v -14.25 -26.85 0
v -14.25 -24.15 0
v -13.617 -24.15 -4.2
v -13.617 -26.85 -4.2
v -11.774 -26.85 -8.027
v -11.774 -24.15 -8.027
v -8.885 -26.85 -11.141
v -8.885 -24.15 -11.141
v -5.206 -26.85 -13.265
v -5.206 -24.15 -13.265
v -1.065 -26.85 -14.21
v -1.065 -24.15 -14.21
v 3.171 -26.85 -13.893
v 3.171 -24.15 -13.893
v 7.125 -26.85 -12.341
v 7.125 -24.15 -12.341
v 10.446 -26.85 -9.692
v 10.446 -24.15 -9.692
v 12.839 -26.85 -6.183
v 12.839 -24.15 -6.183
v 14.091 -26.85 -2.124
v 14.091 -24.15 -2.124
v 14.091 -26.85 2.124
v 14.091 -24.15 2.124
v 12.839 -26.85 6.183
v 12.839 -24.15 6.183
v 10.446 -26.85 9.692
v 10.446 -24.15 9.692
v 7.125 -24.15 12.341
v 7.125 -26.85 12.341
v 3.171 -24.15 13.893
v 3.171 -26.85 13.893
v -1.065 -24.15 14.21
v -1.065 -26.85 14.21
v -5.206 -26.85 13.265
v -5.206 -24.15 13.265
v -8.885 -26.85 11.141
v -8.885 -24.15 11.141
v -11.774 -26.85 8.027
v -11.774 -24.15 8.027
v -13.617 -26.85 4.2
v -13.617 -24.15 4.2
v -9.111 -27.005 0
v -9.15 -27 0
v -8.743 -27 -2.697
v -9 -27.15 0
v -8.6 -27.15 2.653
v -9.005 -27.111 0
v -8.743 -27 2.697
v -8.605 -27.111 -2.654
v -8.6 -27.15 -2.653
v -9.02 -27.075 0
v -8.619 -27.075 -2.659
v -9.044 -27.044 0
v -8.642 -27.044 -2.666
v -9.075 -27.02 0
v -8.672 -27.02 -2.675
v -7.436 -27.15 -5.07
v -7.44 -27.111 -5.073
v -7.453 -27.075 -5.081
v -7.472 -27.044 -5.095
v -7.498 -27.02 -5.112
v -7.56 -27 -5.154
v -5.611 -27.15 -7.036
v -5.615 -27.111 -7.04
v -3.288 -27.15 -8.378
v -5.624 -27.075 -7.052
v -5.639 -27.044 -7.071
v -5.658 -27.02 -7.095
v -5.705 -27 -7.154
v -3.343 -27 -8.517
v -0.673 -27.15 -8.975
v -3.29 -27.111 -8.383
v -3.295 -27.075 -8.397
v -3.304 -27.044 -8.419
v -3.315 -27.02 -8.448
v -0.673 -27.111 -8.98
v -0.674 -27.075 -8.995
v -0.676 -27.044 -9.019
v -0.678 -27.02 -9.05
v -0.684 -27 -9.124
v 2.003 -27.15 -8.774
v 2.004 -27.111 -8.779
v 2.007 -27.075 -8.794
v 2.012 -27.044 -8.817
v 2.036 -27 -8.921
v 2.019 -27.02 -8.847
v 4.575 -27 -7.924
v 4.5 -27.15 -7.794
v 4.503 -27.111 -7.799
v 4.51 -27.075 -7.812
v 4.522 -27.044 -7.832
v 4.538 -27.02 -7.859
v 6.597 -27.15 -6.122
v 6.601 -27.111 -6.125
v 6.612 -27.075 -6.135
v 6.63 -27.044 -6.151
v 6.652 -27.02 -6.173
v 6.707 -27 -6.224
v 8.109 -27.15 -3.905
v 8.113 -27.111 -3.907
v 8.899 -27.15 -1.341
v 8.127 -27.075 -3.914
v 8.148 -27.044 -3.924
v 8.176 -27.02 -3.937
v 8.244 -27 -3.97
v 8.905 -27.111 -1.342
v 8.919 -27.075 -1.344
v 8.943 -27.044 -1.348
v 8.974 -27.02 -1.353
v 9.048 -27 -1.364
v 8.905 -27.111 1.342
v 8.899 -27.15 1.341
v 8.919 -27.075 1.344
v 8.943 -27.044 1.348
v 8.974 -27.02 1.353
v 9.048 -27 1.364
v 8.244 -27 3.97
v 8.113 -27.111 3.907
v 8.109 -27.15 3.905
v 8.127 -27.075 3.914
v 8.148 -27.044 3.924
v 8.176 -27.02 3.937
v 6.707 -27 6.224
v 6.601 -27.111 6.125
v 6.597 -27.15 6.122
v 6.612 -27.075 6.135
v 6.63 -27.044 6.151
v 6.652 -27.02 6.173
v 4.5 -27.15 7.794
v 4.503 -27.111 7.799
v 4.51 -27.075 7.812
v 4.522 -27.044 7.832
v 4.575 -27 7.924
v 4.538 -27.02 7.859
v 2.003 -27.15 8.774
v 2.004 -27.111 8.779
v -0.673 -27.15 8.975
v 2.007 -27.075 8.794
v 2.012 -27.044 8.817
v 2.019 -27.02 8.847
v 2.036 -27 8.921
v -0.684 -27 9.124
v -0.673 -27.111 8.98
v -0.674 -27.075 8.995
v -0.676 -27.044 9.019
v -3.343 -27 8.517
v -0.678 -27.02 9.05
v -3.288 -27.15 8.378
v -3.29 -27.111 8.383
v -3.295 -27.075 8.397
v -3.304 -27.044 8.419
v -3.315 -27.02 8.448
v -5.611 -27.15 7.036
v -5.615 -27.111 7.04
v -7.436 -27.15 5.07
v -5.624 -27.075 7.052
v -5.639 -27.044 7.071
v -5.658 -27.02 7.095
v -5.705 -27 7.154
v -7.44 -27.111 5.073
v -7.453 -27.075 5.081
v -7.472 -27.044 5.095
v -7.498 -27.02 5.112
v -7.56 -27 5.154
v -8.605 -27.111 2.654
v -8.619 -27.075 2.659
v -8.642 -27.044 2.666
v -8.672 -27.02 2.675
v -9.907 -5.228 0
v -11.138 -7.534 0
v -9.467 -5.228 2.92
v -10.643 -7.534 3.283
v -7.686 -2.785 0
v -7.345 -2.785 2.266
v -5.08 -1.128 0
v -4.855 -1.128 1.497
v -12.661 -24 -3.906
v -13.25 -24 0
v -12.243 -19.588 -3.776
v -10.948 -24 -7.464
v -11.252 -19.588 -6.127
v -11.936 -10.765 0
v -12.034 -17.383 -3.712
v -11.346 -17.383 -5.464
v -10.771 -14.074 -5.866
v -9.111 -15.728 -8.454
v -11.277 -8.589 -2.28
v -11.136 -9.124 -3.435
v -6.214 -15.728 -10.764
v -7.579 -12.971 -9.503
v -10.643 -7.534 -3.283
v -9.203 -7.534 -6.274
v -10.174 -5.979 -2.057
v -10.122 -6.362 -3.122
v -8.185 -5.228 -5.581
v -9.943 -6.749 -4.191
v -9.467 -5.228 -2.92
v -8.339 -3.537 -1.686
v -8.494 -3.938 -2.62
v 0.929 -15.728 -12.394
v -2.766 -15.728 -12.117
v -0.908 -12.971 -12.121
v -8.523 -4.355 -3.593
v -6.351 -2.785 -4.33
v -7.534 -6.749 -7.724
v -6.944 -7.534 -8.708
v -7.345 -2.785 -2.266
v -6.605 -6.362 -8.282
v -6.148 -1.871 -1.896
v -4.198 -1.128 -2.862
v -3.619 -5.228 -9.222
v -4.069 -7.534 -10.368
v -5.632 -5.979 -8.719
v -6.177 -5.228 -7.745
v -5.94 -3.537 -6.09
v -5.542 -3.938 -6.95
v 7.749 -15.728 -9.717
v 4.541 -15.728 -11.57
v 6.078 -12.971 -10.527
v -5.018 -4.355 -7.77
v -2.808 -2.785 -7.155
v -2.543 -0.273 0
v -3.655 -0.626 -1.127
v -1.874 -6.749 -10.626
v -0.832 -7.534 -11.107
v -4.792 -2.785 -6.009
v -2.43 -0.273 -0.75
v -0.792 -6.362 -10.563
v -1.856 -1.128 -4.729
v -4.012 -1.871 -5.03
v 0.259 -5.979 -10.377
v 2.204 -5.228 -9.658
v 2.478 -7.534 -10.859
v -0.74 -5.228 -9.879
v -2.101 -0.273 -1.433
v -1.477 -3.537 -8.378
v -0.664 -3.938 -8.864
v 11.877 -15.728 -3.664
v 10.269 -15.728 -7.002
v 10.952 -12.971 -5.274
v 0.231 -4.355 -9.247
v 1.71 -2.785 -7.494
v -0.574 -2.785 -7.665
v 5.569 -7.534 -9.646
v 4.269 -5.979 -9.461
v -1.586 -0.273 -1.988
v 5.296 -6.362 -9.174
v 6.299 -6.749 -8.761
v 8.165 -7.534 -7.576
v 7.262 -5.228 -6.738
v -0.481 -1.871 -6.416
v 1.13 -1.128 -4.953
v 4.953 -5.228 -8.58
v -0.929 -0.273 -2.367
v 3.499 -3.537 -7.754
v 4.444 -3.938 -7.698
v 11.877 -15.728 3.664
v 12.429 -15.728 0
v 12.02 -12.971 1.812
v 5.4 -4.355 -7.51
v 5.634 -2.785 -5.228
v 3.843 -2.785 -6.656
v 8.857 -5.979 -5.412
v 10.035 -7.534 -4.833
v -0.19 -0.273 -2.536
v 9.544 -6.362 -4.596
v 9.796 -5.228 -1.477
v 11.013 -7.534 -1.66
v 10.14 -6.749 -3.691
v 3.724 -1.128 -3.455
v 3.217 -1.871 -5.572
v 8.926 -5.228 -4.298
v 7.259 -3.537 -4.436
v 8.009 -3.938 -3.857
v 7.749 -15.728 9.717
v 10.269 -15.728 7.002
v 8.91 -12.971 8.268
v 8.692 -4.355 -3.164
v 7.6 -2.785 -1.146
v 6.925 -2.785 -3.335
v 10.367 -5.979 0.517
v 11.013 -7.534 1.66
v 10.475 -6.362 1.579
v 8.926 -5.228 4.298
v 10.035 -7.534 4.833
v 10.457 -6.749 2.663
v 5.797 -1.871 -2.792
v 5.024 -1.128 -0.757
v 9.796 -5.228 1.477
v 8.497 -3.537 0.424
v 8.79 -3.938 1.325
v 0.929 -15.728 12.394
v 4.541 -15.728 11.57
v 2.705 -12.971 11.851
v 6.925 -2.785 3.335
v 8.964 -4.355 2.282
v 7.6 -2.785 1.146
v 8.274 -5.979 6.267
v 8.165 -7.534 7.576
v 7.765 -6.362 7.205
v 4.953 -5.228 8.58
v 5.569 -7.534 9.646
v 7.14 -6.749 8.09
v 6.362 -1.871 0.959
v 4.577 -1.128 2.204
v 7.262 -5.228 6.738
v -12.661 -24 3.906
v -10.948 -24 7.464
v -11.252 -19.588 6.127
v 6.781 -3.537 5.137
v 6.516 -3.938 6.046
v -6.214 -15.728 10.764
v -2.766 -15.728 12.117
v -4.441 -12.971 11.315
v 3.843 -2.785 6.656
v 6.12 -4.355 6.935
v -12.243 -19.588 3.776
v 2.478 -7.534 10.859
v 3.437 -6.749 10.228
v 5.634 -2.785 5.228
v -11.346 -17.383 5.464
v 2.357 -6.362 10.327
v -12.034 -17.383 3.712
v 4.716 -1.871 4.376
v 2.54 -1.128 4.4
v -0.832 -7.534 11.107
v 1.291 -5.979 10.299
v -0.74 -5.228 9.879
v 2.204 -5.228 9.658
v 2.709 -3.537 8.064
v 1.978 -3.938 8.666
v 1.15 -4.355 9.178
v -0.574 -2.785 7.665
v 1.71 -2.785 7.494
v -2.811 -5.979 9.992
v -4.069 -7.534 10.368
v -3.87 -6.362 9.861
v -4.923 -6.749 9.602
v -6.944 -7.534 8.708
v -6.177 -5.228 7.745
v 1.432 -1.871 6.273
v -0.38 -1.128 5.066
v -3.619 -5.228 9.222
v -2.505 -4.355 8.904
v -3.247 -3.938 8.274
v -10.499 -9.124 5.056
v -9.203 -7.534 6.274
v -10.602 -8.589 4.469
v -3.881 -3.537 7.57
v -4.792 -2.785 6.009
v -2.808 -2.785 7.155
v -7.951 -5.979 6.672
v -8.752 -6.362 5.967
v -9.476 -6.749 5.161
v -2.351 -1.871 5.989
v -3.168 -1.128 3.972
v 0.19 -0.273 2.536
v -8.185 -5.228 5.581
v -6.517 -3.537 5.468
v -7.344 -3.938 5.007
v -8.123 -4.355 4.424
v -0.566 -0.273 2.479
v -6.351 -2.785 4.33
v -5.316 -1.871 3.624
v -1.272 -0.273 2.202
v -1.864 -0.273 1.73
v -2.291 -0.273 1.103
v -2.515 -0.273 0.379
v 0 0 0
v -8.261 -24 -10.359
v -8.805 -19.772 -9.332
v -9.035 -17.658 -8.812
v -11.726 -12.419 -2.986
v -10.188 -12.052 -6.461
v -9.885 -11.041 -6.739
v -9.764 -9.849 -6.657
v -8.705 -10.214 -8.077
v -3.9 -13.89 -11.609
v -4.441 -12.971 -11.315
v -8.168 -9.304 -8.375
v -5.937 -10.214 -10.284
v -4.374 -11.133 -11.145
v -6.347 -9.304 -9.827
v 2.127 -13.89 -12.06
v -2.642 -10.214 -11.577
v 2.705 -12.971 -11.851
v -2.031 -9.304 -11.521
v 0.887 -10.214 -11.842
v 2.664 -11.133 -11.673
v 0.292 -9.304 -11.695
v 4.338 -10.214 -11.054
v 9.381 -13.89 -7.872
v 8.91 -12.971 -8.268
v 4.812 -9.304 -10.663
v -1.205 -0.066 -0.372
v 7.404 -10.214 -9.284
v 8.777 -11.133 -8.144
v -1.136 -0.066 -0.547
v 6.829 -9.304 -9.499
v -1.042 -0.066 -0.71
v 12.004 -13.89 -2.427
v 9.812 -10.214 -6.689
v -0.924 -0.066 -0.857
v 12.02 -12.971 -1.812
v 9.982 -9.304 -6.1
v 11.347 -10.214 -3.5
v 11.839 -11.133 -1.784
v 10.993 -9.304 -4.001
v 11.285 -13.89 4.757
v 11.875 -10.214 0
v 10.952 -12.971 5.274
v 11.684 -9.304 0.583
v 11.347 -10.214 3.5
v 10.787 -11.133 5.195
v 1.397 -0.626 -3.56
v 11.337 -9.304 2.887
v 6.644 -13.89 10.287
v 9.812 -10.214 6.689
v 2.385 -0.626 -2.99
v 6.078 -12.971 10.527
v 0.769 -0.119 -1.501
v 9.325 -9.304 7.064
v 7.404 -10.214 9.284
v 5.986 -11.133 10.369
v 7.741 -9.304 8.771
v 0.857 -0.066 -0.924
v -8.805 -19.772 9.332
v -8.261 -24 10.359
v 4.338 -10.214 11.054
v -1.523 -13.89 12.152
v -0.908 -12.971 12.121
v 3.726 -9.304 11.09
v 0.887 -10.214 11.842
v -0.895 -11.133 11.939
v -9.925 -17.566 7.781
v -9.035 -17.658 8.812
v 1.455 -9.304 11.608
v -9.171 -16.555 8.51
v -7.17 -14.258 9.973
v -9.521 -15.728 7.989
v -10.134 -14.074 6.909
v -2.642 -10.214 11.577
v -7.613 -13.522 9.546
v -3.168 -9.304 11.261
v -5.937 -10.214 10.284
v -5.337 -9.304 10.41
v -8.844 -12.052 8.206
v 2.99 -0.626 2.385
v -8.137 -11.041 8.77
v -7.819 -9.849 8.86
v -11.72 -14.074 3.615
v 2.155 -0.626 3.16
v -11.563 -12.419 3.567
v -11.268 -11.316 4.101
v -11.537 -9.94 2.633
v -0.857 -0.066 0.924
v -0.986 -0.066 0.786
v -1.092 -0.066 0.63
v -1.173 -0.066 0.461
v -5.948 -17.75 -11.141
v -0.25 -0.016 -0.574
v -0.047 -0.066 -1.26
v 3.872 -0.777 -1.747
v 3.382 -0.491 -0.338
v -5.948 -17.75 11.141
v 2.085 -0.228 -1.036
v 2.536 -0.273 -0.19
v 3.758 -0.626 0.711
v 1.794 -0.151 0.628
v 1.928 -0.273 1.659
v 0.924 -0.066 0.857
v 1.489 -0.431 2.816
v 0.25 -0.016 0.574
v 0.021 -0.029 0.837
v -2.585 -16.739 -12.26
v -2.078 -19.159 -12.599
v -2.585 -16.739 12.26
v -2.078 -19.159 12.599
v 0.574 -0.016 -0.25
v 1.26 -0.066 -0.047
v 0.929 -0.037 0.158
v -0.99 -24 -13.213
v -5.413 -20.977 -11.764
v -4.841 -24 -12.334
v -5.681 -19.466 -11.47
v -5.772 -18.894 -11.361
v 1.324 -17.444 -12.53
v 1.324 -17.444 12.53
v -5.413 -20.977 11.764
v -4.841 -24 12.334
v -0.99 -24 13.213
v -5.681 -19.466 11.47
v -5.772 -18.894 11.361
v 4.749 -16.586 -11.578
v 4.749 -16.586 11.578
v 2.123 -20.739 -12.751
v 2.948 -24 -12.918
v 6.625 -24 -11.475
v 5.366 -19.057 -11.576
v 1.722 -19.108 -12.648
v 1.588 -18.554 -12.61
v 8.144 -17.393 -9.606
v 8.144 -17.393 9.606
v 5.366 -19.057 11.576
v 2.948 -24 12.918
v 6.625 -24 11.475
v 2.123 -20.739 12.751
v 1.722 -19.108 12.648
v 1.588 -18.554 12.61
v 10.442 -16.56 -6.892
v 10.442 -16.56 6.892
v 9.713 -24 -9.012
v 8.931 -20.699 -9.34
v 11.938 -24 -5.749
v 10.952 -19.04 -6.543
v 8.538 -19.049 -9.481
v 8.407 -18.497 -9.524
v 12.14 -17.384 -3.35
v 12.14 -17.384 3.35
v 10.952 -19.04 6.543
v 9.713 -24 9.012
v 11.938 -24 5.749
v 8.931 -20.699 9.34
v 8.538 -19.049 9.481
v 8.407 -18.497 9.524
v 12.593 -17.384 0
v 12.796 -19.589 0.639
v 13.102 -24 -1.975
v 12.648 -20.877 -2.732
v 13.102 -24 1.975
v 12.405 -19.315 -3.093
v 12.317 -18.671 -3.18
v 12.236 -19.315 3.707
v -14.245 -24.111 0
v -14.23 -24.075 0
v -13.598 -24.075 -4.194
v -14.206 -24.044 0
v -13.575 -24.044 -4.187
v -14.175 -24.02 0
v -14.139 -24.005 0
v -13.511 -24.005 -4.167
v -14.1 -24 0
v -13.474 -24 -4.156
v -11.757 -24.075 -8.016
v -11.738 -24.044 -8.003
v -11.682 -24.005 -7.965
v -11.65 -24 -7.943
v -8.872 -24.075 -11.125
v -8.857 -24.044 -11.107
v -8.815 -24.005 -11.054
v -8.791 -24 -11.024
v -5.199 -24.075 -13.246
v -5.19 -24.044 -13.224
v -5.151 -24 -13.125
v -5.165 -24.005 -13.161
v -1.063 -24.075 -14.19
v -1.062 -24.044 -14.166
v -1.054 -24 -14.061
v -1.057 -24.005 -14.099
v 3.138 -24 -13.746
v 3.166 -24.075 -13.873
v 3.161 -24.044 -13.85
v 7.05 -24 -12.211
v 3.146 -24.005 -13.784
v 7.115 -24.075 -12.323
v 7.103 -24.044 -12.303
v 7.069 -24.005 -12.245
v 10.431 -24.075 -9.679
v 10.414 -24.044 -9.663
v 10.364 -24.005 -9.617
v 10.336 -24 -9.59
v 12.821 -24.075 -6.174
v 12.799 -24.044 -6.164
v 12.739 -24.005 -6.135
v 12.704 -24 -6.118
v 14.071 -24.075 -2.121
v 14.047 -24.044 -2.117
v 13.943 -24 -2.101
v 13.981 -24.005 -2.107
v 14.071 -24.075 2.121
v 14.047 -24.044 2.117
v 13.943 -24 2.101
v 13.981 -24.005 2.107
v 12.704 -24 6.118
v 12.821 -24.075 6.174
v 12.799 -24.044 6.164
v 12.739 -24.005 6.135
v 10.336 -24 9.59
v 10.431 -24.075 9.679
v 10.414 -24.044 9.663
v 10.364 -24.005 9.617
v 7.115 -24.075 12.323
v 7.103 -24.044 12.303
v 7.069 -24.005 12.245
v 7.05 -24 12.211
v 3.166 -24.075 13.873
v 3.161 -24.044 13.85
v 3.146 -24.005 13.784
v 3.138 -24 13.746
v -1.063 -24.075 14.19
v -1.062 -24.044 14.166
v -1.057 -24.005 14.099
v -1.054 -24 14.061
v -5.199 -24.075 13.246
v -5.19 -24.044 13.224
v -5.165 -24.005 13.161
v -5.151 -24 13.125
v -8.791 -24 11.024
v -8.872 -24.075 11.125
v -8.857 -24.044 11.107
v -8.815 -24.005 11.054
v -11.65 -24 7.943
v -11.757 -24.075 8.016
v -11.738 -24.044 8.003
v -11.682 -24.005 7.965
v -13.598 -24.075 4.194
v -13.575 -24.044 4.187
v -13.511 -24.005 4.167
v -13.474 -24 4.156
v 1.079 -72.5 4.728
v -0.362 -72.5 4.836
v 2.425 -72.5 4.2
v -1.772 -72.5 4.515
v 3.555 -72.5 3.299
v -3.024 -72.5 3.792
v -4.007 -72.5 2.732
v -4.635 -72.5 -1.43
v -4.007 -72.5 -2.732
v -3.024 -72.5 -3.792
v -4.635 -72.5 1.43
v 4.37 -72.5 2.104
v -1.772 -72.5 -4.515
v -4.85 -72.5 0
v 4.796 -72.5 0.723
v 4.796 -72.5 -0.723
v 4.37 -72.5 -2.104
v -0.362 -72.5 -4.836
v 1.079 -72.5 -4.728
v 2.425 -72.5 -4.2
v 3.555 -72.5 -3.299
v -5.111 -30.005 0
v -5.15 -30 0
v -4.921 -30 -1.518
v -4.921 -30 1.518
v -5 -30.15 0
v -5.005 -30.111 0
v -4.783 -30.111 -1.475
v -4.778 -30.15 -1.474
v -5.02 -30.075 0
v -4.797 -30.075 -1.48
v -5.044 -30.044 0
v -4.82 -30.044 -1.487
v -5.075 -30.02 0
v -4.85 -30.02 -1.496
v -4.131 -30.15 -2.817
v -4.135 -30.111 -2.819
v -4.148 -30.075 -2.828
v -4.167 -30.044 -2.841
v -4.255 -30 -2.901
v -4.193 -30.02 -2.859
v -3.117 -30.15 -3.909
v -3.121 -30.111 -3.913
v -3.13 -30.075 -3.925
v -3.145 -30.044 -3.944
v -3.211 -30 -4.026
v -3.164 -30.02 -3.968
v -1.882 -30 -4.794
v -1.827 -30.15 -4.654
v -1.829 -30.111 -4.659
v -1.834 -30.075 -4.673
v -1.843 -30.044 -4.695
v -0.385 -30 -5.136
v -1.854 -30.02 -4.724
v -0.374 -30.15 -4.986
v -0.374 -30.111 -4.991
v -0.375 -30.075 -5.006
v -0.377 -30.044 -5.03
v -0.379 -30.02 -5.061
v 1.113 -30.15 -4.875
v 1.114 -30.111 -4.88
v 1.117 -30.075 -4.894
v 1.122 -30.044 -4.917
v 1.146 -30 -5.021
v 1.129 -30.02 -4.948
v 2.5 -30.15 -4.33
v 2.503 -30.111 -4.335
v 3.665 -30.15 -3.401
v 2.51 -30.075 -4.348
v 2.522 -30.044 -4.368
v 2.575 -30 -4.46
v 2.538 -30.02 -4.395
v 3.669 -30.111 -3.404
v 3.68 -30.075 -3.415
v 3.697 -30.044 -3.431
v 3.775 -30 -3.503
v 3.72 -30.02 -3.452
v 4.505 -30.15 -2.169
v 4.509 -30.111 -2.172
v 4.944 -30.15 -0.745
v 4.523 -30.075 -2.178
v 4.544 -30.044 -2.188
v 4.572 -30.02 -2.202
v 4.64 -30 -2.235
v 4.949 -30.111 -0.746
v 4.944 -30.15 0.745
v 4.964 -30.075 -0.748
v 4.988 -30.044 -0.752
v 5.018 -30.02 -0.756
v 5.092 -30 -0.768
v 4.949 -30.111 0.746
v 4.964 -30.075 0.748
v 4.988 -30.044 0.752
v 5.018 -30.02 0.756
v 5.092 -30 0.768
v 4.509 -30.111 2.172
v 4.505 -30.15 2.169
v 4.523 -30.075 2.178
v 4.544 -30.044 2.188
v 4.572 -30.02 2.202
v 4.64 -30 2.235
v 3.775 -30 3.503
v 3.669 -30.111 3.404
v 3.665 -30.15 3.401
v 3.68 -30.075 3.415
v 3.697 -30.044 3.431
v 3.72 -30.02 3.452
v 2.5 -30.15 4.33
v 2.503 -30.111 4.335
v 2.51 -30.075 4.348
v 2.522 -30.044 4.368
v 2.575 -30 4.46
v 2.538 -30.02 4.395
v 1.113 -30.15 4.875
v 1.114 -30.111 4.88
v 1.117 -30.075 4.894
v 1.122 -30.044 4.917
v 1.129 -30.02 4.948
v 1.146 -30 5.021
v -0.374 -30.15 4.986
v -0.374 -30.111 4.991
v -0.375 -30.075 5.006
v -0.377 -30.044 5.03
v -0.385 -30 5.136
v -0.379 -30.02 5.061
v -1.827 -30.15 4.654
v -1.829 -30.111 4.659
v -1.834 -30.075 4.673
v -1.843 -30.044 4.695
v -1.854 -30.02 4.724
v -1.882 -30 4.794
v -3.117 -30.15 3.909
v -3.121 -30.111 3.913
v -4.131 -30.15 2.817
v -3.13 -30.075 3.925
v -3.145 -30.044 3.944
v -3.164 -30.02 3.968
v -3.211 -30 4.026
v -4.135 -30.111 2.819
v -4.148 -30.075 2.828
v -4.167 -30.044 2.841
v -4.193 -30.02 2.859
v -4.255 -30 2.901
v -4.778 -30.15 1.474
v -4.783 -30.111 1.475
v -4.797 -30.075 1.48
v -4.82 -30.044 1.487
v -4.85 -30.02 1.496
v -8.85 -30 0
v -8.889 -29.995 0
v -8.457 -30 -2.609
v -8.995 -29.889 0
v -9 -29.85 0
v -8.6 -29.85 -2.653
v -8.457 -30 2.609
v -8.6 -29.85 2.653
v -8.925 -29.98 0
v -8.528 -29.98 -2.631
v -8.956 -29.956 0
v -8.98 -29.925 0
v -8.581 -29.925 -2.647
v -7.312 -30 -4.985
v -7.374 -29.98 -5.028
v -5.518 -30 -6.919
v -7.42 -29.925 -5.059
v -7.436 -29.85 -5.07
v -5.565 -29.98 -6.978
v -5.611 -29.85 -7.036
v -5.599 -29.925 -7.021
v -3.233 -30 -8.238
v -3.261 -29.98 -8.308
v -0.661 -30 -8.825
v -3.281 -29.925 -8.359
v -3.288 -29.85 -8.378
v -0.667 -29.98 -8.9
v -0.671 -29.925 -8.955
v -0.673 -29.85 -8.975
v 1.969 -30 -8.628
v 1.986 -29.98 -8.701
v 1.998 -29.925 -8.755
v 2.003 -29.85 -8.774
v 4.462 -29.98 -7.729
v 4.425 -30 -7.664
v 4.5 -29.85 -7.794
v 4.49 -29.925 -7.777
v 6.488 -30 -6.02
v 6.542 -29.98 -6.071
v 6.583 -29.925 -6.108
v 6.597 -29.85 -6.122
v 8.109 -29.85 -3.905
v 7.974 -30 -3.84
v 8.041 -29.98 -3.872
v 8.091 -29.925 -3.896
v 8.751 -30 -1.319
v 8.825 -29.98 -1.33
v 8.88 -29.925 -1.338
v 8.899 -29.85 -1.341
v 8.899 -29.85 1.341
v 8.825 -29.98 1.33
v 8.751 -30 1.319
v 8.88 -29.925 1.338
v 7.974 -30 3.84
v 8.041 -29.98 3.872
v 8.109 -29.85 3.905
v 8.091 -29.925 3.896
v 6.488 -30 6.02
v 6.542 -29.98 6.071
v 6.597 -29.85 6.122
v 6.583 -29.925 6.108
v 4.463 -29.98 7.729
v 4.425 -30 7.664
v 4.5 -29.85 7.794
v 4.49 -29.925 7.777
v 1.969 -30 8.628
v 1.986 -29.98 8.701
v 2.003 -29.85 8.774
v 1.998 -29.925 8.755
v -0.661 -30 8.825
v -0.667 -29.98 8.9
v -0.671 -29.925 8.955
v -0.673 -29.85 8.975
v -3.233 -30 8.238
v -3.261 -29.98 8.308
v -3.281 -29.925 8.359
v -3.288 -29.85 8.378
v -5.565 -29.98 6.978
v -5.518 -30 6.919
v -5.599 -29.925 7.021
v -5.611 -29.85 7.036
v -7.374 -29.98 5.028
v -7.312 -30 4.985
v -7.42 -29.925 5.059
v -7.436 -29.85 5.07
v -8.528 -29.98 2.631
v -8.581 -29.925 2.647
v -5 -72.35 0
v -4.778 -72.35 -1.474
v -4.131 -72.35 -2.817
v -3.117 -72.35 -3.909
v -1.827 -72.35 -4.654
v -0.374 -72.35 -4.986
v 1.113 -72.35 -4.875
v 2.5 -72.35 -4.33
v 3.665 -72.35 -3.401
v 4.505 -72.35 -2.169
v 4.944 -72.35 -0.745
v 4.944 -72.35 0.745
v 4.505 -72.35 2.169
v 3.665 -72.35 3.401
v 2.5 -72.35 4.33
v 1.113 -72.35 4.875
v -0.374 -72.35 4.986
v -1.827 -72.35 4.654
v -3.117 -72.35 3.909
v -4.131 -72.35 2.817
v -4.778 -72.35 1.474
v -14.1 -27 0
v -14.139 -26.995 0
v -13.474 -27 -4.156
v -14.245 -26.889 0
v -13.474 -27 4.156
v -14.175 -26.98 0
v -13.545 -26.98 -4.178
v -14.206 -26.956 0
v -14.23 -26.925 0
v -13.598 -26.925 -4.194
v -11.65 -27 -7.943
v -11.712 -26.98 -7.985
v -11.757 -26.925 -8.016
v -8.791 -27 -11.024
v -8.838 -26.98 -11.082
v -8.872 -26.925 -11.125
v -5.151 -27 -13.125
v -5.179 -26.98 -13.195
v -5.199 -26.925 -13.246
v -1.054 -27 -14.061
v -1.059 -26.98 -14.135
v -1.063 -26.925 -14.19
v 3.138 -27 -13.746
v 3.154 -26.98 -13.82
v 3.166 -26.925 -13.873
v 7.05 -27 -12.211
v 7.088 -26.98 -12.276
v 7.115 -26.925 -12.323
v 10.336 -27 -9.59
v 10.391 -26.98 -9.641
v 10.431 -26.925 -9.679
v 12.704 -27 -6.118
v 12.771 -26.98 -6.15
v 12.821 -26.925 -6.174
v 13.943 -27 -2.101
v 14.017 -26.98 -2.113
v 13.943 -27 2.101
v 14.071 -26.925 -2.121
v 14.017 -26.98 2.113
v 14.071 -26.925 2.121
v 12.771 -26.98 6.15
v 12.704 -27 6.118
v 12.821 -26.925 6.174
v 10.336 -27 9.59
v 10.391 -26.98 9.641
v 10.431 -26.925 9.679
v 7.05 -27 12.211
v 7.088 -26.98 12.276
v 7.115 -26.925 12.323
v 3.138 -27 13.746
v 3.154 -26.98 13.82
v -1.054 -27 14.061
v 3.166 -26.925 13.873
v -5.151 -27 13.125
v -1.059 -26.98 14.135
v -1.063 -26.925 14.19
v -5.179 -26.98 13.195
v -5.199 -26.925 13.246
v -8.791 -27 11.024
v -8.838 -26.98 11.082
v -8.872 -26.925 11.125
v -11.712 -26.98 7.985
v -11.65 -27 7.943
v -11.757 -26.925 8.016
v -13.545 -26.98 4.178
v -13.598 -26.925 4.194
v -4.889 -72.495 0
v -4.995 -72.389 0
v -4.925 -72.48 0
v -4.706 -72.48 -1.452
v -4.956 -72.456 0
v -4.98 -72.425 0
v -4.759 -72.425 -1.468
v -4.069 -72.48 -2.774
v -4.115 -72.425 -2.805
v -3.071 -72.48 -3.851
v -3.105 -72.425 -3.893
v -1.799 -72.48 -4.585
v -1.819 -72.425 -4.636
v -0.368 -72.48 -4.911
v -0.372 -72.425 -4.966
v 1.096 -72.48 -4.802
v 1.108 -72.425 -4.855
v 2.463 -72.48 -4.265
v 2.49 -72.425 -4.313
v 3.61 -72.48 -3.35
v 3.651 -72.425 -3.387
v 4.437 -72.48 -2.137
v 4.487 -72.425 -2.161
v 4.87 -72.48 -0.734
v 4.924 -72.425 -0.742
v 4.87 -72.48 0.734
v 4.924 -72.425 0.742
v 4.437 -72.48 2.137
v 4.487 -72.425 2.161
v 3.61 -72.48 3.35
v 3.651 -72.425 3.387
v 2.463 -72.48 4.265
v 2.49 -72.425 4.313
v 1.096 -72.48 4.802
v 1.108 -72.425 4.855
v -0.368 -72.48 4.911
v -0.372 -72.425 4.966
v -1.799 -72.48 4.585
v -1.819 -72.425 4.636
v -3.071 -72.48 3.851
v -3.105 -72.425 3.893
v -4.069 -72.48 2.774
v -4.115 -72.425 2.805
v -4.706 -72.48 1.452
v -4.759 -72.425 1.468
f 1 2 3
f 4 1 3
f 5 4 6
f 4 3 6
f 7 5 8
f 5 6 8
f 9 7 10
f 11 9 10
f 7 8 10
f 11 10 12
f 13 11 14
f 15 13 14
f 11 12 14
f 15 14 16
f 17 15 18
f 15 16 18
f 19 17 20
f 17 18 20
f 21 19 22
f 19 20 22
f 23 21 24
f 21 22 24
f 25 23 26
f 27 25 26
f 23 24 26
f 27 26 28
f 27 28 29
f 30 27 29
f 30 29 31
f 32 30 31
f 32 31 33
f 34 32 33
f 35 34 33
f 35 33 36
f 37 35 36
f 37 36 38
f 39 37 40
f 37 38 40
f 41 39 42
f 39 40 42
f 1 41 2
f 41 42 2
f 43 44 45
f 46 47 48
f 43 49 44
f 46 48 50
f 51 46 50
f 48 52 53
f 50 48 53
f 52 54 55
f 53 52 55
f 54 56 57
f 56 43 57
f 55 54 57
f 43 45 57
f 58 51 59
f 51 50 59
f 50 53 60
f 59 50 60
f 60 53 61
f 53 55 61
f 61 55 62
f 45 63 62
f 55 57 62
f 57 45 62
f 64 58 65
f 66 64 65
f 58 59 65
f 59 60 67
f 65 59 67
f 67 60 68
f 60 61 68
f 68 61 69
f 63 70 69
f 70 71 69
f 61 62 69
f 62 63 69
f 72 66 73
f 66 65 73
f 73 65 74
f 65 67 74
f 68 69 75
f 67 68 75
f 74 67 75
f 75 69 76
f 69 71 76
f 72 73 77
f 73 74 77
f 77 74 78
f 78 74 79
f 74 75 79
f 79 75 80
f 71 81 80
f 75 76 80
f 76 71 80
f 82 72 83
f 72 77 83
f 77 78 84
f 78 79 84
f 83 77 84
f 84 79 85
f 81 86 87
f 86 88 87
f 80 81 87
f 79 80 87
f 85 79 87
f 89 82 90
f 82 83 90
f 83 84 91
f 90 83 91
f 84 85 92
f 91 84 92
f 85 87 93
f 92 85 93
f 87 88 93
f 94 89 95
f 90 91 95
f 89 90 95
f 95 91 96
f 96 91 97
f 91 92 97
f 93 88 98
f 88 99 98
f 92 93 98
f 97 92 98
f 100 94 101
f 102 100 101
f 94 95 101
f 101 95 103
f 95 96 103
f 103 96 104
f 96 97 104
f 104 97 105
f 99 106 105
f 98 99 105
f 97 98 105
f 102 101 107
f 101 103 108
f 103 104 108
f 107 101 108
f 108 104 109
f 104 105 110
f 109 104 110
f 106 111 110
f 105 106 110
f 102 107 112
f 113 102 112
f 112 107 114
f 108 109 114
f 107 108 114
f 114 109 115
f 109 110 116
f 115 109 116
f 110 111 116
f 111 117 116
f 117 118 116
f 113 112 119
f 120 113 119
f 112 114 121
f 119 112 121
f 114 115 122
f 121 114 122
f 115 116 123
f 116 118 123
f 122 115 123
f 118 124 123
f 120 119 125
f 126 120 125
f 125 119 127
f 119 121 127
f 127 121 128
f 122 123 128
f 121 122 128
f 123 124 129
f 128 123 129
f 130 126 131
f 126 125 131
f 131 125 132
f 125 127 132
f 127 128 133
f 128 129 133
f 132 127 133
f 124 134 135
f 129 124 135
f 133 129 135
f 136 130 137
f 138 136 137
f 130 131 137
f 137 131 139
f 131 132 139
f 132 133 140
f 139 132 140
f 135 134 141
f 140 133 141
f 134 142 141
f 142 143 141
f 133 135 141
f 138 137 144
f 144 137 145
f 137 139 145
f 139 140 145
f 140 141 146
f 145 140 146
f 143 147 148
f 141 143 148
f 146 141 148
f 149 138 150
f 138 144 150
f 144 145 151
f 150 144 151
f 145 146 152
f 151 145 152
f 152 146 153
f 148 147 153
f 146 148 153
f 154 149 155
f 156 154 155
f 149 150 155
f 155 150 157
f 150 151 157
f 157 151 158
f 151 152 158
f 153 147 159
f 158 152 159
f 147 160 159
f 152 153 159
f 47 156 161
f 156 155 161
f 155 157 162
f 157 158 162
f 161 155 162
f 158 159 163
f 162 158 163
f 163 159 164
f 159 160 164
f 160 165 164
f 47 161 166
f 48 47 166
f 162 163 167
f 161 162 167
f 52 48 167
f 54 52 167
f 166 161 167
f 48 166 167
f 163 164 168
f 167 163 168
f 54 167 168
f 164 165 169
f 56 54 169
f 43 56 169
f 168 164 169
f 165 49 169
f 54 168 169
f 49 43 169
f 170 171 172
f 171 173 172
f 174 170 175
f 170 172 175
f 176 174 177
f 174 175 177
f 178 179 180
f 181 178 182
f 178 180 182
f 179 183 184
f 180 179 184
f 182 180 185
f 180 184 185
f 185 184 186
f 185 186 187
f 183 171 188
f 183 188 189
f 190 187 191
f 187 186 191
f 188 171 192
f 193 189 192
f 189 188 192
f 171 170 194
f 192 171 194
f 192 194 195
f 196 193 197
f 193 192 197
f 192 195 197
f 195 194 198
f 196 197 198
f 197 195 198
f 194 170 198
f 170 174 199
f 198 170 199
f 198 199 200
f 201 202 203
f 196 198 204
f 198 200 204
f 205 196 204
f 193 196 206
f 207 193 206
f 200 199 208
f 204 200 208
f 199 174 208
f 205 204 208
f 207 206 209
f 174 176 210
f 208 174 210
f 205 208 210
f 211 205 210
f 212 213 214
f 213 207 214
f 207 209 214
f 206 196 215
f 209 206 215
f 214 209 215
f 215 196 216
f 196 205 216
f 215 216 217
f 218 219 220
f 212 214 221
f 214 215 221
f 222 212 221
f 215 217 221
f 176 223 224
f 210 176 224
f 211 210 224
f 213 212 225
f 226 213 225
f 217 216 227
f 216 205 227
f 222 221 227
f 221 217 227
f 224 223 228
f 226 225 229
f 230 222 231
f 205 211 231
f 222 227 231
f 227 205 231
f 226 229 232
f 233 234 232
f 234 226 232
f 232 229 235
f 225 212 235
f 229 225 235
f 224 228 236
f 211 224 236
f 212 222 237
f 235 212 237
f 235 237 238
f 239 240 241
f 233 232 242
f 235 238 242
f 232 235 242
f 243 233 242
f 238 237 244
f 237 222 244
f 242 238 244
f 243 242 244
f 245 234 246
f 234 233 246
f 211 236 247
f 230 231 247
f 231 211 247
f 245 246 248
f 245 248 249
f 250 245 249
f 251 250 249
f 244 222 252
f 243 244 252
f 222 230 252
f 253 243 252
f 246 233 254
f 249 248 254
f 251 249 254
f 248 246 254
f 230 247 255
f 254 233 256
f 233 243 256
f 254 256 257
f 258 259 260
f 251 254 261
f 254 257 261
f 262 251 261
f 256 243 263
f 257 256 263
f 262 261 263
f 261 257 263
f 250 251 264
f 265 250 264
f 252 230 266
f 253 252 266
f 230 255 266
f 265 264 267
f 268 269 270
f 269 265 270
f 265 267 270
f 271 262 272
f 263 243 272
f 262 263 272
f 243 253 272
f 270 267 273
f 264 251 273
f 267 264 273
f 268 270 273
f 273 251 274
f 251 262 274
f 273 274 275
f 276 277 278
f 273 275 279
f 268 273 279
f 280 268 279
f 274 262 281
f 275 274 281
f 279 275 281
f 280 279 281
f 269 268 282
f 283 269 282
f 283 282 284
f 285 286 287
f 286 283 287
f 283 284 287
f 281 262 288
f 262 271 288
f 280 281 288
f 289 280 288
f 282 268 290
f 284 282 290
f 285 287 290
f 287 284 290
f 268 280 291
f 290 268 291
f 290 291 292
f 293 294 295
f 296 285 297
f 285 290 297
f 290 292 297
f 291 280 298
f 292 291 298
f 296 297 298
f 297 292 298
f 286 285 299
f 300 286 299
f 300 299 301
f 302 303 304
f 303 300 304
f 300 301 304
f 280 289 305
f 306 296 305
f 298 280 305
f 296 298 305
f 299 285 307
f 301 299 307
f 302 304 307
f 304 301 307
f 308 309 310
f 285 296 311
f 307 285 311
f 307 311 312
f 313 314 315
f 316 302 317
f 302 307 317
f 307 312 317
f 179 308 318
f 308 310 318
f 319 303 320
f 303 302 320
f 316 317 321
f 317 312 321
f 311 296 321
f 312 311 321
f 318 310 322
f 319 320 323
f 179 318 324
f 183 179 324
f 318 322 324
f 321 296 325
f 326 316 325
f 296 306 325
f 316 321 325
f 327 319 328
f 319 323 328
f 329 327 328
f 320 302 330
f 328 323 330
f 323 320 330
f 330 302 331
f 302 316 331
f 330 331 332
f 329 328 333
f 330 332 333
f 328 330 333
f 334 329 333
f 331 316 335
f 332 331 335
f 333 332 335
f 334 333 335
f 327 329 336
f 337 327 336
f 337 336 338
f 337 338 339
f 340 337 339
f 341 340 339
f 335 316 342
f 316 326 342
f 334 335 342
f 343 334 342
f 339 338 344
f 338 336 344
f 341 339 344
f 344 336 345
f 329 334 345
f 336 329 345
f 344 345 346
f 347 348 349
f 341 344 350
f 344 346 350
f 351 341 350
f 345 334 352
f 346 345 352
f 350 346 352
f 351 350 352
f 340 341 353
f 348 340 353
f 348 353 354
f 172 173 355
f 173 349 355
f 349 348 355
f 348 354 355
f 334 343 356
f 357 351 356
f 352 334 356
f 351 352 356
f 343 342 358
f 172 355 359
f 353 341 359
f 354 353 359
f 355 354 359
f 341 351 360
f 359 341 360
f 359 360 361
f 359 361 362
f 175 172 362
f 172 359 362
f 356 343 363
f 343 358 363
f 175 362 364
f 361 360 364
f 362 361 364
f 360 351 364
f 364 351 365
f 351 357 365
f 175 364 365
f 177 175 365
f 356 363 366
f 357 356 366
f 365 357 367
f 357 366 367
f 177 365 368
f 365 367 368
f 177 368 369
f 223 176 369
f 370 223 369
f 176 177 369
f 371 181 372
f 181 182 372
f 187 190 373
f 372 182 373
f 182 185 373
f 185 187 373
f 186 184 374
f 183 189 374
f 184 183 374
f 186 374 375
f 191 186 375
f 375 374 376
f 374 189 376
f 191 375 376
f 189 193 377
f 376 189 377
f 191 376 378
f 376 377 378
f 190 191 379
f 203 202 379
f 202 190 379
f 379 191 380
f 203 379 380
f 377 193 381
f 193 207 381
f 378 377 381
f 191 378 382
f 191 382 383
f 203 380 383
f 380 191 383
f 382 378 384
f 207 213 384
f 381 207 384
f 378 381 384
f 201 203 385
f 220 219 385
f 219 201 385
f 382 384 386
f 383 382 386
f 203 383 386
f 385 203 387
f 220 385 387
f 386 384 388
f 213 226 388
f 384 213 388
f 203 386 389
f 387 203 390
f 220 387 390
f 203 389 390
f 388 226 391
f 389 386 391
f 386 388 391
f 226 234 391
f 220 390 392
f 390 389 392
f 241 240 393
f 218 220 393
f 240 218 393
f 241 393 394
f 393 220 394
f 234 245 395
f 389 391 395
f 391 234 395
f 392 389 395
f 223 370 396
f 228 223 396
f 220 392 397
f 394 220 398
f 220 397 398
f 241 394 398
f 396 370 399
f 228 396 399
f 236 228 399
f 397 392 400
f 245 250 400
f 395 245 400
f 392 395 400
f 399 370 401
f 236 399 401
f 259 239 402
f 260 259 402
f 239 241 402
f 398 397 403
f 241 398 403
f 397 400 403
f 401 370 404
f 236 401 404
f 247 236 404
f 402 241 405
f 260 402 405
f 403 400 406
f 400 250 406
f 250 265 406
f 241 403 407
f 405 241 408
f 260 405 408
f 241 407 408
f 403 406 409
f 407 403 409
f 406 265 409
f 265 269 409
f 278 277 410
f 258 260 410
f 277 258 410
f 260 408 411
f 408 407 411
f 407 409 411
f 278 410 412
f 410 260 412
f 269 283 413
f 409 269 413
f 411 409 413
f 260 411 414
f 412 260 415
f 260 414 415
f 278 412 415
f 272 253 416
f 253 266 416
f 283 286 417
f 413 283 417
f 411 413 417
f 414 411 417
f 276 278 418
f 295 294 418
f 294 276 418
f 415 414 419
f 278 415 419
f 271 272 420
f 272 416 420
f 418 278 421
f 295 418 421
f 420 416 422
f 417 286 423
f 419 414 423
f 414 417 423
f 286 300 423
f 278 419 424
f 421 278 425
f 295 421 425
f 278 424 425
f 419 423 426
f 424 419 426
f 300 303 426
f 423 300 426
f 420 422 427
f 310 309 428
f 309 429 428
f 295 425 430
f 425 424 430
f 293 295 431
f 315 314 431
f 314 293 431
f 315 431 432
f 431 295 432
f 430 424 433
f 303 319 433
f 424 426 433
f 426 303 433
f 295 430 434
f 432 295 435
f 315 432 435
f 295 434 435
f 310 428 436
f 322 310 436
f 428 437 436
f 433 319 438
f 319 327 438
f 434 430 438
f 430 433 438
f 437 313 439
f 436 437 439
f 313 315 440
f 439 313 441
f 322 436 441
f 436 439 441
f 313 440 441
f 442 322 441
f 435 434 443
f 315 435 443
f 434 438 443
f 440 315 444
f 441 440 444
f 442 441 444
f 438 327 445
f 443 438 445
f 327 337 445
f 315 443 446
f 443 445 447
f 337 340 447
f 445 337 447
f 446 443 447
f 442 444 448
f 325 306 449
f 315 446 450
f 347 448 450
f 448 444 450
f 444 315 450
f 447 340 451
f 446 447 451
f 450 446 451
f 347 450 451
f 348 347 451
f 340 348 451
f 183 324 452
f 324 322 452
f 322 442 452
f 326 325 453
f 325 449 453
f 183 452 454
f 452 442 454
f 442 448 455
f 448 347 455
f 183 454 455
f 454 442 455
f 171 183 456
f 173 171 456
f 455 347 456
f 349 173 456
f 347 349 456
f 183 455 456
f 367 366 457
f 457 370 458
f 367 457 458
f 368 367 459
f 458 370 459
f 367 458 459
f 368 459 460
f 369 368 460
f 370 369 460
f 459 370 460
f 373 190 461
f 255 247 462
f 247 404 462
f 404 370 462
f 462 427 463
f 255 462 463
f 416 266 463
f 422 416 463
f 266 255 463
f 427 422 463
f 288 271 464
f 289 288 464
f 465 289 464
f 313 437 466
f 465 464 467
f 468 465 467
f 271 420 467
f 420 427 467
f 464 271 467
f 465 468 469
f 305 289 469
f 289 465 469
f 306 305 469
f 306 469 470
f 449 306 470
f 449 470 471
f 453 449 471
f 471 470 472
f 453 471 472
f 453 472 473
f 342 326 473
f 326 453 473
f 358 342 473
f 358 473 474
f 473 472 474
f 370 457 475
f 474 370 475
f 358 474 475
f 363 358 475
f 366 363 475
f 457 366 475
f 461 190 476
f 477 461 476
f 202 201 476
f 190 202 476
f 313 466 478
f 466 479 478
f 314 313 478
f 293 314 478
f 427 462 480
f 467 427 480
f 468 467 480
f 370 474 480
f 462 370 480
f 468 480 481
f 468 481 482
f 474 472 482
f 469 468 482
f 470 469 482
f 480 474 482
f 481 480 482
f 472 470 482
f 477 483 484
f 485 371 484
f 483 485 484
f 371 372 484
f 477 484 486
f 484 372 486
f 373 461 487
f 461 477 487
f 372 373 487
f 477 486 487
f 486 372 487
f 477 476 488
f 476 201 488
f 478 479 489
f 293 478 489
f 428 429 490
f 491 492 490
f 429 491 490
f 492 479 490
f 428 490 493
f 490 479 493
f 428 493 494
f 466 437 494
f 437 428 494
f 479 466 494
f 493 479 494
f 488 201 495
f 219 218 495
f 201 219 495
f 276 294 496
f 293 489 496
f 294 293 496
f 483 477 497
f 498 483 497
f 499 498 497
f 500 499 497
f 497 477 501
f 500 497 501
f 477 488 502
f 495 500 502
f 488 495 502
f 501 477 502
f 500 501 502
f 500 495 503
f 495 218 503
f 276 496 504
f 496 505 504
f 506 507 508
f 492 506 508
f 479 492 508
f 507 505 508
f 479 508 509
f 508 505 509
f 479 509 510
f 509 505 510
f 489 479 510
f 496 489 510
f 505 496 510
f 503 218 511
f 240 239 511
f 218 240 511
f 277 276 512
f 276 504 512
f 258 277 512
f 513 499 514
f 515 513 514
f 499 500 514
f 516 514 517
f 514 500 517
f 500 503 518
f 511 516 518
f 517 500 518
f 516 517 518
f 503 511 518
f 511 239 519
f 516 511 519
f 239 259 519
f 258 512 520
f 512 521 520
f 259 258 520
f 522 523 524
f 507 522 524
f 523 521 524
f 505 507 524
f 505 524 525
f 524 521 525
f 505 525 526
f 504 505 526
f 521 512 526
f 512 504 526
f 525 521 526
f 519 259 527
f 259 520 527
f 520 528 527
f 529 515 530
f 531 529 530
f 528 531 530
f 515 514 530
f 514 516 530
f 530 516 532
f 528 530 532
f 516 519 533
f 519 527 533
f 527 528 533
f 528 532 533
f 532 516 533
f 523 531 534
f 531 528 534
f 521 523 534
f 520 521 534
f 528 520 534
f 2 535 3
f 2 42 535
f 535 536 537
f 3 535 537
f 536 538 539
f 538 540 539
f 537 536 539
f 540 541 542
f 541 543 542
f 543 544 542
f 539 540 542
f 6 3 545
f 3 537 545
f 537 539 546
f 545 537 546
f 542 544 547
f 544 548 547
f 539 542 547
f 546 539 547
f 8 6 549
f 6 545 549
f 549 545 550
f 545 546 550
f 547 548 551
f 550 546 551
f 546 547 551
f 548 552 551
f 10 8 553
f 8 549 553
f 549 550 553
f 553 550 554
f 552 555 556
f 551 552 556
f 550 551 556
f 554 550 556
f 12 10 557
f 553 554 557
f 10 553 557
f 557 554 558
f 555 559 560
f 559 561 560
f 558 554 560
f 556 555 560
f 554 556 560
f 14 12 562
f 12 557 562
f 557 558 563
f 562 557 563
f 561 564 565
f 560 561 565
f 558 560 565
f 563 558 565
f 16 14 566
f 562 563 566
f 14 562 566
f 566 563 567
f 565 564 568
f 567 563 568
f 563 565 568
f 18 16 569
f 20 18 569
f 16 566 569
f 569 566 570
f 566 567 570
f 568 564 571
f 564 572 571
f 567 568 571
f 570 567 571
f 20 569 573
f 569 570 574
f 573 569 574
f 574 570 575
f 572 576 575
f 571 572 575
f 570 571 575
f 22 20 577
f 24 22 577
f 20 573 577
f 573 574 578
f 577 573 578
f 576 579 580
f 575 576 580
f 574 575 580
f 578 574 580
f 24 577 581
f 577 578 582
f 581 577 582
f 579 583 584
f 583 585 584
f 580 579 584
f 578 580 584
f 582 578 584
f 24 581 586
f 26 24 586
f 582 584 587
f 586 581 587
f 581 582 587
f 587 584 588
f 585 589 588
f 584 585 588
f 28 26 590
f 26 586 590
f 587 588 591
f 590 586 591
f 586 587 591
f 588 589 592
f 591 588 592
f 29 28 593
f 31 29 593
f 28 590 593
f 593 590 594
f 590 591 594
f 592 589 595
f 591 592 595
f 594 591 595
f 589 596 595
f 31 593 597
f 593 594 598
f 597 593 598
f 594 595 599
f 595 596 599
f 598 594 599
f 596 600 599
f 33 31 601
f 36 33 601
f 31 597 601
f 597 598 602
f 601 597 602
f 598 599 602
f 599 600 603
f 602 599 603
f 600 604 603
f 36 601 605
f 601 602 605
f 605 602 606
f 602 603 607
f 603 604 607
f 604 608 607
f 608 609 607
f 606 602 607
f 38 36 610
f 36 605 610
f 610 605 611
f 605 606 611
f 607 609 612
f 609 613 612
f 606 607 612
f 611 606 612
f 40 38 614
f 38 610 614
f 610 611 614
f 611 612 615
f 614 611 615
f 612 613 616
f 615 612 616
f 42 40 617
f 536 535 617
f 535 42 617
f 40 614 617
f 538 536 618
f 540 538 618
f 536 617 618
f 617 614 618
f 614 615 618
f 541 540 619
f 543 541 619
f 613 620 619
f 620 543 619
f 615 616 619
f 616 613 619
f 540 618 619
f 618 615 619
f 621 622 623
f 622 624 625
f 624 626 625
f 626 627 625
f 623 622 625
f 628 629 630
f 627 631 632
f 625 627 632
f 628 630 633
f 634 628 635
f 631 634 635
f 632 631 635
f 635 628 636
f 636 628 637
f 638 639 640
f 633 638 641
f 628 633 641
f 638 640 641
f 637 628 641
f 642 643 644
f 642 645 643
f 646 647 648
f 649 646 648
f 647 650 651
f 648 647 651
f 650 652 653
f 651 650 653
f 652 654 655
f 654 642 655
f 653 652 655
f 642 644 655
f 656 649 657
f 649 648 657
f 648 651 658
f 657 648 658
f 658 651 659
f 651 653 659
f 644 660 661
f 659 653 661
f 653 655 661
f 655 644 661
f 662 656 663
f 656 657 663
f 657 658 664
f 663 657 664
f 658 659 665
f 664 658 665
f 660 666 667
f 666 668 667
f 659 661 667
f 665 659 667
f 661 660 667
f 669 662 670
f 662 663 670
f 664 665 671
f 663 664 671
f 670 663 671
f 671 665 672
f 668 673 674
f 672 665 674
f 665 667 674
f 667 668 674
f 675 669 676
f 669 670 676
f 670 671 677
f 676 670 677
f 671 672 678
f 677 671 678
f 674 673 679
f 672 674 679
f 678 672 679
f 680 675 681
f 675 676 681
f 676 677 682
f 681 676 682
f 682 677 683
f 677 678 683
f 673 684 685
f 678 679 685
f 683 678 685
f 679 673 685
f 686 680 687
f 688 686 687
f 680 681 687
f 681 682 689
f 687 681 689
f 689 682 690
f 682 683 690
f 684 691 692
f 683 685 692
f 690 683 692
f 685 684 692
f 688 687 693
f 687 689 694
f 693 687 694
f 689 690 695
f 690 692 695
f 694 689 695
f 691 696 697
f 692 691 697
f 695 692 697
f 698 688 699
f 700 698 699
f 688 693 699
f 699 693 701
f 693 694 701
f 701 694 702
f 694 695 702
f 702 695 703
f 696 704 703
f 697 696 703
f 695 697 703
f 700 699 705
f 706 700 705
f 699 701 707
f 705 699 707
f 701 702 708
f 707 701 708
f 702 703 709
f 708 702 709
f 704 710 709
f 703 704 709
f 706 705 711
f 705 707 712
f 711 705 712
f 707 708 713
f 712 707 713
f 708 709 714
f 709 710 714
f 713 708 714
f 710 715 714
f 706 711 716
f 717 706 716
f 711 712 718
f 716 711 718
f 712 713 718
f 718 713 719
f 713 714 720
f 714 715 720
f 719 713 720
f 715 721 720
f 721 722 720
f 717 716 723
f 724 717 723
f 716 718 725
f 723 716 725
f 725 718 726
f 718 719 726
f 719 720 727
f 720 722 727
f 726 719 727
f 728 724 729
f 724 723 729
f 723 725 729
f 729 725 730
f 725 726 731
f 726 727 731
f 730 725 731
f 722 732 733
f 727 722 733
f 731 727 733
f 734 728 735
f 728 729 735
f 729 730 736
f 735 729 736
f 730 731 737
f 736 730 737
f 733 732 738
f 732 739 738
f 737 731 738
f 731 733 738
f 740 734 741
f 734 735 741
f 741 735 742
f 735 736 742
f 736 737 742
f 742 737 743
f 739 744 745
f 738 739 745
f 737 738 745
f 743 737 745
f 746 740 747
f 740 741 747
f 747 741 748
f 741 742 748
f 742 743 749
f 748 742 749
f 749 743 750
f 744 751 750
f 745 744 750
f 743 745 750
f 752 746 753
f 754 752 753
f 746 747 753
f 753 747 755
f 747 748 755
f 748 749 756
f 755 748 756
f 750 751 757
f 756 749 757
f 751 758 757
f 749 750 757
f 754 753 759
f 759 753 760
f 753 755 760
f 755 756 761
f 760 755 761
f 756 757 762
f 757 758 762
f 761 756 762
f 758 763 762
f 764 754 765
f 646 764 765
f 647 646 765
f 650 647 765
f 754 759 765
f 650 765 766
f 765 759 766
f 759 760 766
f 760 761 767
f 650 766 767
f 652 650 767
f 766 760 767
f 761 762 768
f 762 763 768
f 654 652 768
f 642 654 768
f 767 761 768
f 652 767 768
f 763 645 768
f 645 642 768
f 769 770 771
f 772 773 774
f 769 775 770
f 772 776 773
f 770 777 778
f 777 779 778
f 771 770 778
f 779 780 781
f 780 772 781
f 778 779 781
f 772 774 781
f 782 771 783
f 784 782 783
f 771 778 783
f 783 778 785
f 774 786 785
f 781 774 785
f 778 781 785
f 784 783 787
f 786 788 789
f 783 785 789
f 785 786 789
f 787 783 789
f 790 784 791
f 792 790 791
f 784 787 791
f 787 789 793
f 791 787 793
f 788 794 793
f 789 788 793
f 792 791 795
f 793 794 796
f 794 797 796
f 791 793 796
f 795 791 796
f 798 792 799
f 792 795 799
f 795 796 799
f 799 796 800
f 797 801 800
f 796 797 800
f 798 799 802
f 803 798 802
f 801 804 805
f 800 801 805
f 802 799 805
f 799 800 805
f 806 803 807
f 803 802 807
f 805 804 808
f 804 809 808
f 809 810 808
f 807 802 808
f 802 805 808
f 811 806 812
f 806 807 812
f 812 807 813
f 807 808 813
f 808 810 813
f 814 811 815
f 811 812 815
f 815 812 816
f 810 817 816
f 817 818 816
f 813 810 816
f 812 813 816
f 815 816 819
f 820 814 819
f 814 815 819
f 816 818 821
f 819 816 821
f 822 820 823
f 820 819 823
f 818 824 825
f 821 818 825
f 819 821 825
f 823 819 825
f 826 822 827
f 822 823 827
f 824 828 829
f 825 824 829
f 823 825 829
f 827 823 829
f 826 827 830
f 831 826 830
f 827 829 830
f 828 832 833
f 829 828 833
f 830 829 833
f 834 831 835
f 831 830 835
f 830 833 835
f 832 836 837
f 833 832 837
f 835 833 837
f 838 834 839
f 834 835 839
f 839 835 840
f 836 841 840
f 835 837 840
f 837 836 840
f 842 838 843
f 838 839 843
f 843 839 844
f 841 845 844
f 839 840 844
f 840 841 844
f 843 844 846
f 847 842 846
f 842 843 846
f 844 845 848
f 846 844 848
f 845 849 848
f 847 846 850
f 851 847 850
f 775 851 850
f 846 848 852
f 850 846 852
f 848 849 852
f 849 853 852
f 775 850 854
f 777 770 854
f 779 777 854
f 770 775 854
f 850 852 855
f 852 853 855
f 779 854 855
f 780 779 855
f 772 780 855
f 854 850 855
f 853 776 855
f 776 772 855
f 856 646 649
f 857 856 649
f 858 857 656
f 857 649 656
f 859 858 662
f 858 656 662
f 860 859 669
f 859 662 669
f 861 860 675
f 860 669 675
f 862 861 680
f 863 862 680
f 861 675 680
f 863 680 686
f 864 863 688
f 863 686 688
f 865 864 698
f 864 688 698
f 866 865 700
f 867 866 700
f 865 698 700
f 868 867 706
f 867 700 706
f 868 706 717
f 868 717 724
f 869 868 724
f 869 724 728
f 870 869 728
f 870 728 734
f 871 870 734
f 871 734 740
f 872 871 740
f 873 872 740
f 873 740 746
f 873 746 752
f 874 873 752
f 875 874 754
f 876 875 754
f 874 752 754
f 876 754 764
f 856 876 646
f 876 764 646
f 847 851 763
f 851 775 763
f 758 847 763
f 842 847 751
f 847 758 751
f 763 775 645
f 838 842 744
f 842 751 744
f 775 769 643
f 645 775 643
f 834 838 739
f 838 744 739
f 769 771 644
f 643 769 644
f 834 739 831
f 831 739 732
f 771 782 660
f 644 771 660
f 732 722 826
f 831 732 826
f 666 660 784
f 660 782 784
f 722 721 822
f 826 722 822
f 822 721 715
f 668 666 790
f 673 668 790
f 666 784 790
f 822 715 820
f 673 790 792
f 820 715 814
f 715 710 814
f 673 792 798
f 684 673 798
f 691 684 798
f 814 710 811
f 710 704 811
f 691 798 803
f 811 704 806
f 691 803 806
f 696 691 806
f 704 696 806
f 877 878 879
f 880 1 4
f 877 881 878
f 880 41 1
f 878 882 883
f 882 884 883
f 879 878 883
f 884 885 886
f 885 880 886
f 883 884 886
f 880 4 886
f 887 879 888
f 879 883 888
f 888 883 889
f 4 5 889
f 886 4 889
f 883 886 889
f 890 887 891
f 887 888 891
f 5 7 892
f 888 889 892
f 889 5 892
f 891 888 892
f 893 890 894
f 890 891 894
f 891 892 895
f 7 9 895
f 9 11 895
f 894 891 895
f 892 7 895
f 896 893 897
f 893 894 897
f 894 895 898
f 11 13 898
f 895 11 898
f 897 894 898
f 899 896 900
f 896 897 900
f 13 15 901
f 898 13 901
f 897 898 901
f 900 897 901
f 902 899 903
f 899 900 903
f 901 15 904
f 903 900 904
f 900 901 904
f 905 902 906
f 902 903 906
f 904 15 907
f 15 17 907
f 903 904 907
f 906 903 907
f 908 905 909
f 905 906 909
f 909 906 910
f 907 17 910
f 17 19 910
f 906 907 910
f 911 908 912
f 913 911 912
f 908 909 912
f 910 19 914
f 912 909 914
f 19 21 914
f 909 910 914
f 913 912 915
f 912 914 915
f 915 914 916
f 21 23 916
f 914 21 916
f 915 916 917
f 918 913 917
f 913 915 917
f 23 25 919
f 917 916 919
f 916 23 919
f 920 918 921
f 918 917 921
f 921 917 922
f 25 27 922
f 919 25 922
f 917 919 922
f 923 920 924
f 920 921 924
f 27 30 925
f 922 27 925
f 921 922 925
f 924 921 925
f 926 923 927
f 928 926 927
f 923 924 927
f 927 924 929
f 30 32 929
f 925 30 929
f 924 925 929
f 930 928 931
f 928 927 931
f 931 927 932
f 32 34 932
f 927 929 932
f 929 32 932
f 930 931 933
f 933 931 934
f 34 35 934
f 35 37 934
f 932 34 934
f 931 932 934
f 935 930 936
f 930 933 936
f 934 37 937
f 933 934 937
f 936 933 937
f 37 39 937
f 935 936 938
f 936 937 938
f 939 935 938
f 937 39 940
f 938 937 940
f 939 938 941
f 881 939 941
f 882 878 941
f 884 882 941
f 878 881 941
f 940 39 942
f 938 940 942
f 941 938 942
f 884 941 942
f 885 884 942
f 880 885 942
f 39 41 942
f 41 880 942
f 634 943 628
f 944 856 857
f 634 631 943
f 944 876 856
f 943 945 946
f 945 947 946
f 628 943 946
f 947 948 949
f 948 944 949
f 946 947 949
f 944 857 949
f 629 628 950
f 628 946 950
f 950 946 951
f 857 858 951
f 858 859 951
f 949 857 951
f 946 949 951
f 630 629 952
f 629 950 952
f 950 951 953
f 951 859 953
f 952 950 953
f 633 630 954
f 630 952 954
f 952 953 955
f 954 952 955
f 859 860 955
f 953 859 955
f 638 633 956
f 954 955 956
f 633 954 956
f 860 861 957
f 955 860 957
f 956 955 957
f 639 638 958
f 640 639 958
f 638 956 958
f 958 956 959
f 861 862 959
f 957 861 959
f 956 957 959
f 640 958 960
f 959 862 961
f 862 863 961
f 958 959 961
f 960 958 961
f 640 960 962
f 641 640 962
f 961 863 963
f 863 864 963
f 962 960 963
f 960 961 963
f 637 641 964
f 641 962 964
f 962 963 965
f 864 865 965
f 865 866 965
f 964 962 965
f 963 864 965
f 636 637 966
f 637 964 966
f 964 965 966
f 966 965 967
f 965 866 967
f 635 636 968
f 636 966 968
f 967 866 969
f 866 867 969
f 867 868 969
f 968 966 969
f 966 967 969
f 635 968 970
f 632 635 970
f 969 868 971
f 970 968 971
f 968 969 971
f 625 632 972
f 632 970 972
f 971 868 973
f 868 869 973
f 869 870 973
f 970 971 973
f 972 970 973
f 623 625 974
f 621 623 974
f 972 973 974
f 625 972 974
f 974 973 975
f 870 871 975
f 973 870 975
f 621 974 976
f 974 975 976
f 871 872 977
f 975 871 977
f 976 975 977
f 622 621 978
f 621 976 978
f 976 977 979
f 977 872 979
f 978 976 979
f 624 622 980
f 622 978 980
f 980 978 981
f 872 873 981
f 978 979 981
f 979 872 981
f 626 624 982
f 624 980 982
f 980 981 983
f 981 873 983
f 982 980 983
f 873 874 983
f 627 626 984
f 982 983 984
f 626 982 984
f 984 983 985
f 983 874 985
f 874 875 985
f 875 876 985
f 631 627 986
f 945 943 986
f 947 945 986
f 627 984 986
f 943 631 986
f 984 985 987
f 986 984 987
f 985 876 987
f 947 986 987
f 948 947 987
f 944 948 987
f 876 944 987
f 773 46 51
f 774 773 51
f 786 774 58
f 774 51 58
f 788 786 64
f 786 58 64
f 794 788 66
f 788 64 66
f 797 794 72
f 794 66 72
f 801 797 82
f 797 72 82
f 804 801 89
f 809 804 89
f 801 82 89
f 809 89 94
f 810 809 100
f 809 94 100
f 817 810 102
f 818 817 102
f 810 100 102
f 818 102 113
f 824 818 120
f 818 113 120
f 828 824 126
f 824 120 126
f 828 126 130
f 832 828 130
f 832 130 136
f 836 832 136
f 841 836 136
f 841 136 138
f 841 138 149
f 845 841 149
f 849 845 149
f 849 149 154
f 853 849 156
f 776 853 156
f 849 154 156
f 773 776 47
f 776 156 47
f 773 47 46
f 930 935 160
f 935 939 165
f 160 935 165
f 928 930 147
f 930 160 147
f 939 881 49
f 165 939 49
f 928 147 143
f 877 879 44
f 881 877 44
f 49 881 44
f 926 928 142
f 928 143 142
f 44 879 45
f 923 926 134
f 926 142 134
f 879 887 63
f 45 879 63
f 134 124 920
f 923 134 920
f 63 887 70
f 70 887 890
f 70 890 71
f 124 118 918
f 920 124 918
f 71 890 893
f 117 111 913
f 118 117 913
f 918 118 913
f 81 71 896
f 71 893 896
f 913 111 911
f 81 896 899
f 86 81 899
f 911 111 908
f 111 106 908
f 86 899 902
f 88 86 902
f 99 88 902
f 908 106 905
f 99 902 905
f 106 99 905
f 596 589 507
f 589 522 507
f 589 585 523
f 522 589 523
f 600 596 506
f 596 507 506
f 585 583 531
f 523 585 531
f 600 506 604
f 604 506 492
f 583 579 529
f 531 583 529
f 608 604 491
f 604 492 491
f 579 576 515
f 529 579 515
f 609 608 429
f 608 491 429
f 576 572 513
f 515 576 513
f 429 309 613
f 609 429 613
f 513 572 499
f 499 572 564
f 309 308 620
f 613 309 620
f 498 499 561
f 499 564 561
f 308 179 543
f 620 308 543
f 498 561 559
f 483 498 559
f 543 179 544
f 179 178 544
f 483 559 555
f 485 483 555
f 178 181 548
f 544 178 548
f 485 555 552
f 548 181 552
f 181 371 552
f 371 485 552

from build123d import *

# Parameters (mm, degrees)
FILLET2_R = 0.15


with BuildPart() as part:
    # Sketch1 → Revolve1 (revolve)
    with BuildSketch(Plane.XY, mode=Mode.PRIVATE) as revolve1_sk:
        with BuildLine():
            Line((0, 0), (0, -72.5))
            Line((0, -72.5), (5, -72.5))
            Line((5, -72.5), (5, -30))
            Line((5, -30), (9, -30))
            Line((9, -30), (9, -27))
            Line((9, -27), (14.25, -27))
            Line((14.25, -27), (14.25, -24))
            Line((14.25, -24), (13.25, -24))
            add(Edge.make_bspline(
                [(13.25, -24), (12.876288893, -20.234768096), (12.502577786, -16.469536192), (12.12886668, -12.704304288), (12.10802883, -12.494357794), (12.06635313, -12.074464806), (12.003839581, -11.444625323), (11.962163881, -11.024732334), (11.941326032, -10.81478584), (11.913600396, -10.535443194), (11.858149124, -9.976757903), (11.666555139, -9.148985732), (11.514124842, -8.608285073), (11.428528654, -8.340938262), (9.779050122, -3.189040311), (5.409513095, 0), (0, 0)],
                knots=[0, 0, 0, 0, 0.379321245, 0.379321245, 0.379321245, 0.400471912, 0.421622579, 0.442773246, 0.442773246, 0.442773246, 0.470915098, 0.499056951, 0.527198803, 0.527198803, 0.527198803, 1, 1, 1, 1], degree=3, weights=[1, 1, 1, 1, 1, 1, 1, 1, 1, 1, 1, 1, 1, 1, 0.871833681, 0.871833681, 1]))
        make_face()
    revolve(revolve1_sk.sketch.rotate(Axis((0, 0, 0), (0, -1, 0)), 180), axis=Axis((0, 0, 0), (0, -1, 0)))

    # Fillet2
    fillet2_edges = [part.edges().sort_by_distance(p)[0] for p in [
        (5, -72.5, 0),
        (5, -30, 0),
        (9, -30, 0),
        (9, -27, 0),
        (14.25, -27, 0),
        (14.25, -24, 0),
    ]]
    fillet(fillet2_edges, radius=FILLET2_R)


solid = part.part
